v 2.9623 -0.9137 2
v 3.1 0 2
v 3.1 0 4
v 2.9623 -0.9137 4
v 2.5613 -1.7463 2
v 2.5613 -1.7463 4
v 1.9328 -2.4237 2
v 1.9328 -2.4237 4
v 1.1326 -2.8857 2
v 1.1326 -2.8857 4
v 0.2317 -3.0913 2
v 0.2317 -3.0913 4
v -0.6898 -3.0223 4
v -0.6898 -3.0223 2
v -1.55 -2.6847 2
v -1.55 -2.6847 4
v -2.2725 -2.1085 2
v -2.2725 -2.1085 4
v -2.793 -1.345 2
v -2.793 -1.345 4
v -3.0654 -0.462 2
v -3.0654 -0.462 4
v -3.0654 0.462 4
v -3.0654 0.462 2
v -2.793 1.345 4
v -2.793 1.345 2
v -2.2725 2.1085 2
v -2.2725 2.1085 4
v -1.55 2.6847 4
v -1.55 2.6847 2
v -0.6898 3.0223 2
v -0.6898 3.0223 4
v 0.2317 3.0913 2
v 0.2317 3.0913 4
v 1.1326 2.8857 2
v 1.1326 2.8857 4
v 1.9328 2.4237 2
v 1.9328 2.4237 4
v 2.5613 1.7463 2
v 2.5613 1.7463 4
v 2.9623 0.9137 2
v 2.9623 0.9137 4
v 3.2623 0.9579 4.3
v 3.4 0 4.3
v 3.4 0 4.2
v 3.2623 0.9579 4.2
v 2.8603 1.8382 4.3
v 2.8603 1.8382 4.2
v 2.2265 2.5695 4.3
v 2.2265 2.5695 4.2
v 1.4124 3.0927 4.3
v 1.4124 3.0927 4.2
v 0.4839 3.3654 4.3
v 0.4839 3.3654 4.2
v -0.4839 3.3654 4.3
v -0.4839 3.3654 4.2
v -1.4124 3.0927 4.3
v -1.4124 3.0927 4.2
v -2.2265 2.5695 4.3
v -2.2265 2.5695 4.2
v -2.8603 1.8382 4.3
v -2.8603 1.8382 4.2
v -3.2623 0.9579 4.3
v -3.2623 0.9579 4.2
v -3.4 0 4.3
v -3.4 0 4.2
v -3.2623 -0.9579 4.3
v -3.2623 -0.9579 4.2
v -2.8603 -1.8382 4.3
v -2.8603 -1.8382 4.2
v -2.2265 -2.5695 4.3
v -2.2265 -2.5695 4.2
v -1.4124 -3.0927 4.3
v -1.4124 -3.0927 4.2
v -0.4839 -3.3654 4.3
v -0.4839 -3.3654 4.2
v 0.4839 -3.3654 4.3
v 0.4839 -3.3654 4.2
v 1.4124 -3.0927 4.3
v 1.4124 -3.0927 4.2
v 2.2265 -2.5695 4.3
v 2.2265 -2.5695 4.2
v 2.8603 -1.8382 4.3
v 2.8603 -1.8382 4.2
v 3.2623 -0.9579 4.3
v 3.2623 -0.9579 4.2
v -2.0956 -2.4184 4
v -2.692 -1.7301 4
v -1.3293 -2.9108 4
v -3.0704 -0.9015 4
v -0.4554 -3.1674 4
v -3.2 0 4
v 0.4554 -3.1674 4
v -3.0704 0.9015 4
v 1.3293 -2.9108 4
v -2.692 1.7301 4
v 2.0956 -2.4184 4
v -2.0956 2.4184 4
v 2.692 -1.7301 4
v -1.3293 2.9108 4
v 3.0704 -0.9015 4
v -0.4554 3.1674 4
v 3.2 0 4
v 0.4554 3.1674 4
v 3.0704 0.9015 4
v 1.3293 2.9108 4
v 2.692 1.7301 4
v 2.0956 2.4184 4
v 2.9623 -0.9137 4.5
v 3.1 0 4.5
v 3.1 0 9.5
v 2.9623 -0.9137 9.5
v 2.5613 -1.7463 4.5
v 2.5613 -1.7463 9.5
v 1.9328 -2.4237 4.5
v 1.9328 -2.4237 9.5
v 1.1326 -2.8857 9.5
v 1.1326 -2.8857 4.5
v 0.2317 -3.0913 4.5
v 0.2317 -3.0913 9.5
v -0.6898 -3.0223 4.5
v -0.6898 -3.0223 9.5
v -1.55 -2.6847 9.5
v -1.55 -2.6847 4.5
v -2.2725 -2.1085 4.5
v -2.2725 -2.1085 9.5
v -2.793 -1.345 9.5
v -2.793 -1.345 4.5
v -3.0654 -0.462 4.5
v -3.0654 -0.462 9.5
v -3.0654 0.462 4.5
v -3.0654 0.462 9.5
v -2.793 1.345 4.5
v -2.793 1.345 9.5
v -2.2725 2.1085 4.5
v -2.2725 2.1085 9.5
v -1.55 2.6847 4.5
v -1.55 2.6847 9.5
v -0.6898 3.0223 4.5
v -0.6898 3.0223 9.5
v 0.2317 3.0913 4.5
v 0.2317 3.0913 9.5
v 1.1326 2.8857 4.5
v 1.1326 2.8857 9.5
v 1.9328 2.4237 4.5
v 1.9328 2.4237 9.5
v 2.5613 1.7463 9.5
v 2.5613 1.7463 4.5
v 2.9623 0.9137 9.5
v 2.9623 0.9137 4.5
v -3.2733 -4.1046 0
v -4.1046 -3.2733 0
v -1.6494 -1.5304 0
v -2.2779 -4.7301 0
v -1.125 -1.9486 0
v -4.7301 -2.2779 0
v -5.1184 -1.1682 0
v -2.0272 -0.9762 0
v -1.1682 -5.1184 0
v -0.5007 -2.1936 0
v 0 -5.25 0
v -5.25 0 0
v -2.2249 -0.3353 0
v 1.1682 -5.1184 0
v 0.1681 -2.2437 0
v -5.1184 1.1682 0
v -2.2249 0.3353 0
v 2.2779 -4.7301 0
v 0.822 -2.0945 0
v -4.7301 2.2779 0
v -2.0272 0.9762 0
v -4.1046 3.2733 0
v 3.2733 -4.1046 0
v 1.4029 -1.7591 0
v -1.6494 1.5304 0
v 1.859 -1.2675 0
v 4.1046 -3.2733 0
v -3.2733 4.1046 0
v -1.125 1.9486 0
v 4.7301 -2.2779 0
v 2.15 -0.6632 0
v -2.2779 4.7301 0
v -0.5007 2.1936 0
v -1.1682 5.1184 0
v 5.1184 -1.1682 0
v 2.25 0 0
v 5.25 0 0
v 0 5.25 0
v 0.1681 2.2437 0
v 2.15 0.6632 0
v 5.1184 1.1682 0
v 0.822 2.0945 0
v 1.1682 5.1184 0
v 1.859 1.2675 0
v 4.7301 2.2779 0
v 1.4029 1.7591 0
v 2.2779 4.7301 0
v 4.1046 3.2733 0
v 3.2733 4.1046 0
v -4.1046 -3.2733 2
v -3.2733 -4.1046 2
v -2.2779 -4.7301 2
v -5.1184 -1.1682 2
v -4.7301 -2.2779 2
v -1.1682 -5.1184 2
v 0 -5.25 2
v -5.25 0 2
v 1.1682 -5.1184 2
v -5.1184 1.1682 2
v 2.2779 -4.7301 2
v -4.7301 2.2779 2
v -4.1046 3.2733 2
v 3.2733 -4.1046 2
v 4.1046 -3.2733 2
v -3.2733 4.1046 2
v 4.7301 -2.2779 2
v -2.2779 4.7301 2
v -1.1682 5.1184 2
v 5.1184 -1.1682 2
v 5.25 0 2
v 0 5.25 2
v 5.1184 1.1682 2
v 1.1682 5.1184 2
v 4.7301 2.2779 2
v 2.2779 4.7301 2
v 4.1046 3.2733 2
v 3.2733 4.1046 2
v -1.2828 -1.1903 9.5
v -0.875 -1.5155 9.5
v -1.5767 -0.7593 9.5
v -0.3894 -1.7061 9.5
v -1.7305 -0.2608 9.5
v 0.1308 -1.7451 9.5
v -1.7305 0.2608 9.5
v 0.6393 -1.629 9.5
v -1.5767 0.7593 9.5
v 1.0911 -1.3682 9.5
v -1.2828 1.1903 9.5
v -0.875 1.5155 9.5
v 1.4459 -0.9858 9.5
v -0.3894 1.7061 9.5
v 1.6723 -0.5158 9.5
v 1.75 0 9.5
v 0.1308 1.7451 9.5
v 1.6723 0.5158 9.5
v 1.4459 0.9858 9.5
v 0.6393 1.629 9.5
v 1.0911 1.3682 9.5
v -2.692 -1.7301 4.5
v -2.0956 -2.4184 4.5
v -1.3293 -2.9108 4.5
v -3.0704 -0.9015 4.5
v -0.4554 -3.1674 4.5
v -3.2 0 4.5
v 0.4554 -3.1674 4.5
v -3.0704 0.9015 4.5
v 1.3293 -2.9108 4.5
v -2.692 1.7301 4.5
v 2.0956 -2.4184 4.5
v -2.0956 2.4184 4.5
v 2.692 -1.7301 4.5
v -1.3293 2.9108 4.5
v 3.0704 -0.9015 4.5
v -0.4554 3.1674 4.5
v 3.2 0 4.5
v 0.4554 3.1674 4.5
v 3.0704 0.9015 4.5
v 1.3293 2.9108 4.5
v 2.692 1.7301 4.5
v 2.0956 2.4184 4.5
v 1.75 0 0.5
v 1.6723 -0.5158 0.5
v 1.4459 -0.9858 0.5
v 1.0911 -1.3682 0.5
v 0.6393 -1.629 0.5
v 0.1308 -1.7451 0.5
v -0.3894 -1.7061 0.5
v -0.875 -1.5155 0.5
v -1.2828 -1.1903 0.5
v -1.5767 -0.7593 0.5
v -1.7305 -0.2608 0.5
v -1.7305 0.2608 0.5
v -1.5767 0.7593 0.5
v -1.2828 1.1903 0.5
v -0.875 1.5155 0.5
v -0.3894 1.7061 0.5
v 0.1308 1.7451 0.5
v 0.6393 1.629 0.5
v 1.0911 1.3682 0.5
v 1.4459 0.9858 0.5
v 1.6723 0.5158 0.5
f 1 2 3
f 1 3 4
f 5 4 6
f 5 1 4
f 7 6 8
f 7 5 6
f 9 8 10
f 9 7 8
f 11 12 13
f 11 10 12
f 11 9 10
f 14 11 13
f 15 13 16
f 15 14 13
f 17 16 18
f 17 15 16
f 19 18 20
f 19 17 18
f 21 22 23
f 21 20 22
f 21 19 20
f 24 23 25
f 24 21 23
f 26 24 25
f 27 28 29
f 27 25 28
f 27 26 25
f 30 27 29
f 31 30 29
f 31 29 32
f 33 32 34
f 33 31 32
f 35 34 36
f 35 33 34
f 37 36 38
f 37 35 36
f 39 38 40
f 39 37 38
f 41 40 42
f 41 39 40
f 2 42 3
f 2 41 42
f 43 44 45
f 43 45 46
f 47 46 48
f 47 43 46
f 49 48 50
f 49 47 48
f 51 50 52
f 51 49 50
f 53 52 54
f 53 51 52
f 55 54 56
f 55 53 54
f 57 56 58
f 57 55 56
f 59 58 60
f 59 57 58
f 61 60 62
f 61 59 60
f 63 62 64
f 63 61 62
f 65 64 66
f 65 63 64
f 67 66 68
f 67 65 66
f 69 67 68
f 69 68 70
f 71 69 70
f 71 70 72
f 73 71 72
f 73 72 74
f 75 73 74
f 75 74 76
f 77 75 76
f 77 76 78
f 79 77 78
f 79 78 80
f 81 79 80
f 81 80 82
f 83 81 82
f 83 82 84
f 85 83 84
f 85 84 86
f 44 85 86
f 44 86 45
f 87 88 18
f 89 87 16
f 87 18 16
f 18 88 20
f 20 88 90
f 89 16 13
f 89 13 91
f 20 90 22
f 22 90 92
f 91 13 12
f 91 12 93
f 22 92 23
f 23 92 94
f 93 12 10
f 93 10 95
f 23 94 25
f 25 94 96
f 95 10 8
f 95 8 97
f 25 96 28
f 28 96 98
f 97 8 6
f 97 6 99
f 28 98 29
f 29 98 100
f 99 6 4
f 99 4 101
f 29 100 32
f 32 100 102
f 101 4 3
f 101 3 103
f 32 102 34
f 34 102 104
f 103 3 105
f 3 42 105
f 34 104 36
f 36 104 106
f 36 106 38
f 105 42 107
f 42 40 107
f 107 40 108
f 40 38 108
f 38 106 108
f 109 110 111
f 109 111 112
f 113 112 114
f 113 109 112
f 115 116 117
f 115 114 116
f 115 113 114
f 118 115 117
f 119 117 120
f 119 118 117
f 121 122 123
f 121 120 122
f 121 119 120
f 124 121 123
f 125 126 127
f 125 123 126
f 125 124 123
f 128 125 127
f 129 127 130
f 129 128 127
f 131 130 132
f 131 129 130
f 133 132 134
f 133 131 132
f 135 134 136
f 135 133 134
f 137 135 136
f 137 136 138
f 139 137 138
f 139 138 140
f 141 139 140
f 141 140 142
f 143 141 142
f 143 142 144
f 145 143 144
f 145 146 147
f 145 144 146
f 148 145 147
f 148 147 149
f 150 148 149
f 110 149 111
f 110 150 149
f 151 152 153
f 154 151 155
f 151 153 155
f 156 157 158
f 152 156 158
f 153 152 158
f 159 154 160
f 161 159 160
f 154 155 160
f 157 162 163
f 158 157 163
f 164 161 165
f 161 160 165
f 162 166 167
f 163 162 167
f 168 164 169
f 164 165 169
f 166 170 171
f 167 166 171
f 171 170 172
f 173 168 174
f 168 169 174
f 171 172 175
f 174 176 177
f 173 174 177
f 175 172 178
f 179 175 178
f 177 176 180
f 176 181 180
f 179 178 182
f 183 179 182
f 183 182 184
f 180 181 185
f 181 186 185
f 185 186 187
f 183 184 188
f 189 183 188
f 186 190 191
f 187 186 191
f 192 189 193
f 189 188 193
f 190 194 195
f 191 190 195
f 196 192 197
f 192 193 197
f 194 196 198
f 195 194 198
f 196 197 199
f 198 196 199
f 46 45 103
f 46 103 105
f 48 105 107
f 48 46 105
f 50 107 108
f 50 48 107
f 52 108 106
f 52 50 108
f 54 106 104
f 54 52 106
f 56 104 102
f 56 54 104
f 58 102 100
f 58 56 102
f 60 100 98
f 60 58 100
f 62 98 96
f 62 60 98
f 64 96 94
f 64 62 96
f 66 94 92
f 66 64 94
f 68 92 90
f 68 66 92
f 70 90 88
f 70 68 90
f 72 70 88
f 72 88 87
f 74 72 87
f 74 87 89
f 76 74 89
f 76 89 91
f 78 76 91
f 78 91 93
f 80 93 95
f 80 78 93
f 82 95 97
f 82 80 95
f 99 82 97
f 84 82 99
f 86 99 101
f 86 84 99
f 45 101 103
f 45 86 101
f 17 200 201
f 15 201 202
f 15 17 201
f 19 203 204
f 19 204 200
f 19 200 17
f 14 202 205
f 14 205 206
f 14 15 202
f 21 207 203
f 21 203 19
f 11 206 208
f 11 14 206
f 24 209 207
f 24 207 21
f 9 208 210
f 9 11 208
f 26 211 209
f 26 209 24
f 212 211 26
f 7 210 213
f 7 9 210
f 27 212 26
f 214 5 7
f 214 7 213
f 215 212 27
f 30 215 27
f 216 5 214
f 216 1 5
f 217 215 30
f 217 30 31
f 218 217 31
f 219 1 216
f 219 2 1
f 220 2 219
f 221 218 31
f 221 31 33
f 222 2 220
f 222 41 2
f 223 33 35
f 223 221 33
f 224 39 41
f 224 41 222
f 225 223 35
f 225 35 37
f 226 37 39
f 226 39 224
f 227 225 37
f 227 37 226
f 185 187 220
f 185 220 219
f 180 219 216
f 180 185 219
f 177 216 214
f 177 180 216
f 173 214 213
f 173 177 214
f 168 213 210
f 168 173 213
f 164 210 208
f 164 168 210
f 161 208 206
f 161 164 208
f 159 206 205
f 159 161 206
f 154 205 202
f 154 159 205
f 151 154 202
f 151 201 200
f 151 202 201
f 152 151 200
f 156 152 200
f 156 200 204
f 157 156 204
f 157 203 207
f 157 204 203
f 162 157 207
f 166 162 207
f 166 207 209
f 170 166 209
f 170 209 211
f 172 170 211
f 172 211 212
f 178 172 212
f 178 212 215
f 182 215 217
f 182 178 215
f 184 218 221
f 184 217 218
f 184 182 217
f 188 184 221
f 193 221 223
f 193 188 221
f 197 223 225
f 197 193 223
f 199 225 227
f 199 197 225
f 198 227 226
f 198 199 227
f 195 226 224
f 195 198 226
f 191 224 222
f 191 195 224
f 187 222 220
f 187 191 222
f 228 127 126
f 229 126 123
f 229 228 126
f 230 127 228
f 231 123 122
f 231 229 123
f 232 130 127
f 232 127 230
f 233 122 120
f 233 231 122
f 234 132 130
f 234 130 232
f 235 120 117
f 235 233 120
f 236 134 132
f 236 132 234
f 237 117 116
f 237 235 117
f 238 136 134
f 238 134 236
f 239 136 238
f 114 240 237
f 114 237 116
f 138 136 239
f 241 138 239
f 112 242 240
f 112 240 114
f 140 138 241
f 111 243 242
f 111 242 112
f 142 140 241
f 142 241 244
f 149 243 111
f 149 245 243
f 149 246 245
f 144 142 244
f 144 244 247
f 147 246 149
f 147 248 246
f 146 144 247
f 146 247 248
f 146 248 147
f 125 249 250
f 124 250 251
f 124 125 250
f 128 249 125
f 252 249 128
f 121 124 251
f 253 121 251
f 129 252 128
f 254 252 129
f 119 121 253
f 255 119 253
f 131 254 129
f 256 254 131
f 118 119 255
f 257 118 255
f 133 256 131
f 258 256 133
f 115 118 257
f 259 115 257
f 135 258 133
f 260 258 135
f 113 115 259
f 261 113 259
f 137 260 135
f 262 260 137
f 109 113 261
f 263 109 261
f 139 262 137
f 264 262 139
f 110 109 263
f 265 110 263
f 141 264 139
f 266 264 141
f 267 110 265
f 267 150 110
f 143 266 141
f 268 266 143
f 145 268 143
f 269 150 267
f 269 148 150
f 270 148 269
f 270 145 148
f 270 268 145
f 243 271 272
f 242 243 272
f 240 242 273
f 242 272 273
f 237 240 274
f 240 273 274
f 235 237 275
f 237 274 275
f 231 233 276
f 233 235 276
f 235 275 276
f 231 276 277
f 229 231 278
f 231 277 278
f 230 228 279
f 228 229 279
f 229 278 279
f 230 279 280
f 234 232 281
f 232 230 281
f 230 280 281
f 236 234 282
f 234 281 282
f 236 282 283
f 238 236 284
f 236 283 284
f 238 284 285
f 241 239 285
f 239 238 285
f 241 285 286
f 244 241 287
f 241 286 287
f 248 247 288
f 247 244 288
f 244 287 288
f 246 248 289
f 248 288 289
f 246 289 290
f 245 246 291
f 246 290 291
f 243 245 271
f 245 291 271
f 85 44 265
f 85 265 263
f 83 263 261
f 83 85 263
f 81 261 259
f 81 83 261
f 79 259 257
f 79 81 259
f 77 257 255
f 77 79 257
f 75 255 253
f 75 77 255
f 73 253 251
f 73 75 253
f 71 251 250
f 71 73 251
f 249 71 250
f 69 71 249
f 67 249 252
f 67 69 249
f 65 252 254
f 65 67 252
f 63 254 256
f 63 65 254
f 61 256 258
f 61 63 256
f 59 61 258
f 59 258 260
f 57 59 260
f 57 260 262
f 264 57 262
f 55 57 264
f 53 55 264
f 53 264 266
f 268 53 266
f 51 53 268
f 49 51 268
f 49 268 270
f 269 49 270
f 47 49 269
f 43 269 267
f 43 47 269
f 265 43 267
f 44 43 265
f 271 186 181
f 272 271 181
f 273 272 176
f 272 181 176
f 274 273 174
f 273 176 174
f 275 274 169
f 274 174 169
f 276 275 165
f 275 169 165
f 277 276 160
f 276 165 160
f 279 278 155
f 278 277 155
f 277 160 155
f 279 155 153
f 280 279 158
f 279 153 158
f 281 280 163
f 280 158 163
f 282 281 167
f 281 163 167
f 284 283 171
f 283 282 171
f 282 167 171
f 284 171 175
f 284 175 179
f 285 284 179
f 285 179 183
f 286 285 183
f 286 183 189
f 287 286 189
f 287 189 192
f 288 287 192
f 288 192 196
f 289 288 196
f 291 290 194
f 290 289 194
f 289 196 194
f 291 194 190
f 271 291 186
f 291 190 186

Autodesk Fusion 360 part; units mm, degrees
sketch "Sketch1" plane through (0, 0, 0) normal (0, 0, 1) x (1, 0, 0)
  circle A0 centre (0, 0) radius 5.25
  circle A1 centre (0, 0) radius 3.1
  circle A2 centre (0, 0) radius 1.75
  circle A3 centre (0, 0) radius 3.4
  dimension "d1" = 10.5
  dimension "d2" = 6.2
  dimension "d3" = 3.5
  dimension "d8" = 6.8
extrude "Extrude1" add sketch "Sketch1" along normal blind 9.5 contours A1
extrude "Extrude2" add sketch "Sketch1" along normal blind 2 contours A0 | A3
extrude "Extrude3" add sketch "Sketch1" along normal blind 4 and the other way blind -4.5 contours A3
chamfer "Chamfer1" distance 0.2 angle 45 2 edges at (-3.1699, -1.2295, 4) (-3.1699, -1.2295, 4.5)
chamfer "Chamfer2" distance 0.5 angle 45 1 edges at (-1.6316, 0.6328, 0)
